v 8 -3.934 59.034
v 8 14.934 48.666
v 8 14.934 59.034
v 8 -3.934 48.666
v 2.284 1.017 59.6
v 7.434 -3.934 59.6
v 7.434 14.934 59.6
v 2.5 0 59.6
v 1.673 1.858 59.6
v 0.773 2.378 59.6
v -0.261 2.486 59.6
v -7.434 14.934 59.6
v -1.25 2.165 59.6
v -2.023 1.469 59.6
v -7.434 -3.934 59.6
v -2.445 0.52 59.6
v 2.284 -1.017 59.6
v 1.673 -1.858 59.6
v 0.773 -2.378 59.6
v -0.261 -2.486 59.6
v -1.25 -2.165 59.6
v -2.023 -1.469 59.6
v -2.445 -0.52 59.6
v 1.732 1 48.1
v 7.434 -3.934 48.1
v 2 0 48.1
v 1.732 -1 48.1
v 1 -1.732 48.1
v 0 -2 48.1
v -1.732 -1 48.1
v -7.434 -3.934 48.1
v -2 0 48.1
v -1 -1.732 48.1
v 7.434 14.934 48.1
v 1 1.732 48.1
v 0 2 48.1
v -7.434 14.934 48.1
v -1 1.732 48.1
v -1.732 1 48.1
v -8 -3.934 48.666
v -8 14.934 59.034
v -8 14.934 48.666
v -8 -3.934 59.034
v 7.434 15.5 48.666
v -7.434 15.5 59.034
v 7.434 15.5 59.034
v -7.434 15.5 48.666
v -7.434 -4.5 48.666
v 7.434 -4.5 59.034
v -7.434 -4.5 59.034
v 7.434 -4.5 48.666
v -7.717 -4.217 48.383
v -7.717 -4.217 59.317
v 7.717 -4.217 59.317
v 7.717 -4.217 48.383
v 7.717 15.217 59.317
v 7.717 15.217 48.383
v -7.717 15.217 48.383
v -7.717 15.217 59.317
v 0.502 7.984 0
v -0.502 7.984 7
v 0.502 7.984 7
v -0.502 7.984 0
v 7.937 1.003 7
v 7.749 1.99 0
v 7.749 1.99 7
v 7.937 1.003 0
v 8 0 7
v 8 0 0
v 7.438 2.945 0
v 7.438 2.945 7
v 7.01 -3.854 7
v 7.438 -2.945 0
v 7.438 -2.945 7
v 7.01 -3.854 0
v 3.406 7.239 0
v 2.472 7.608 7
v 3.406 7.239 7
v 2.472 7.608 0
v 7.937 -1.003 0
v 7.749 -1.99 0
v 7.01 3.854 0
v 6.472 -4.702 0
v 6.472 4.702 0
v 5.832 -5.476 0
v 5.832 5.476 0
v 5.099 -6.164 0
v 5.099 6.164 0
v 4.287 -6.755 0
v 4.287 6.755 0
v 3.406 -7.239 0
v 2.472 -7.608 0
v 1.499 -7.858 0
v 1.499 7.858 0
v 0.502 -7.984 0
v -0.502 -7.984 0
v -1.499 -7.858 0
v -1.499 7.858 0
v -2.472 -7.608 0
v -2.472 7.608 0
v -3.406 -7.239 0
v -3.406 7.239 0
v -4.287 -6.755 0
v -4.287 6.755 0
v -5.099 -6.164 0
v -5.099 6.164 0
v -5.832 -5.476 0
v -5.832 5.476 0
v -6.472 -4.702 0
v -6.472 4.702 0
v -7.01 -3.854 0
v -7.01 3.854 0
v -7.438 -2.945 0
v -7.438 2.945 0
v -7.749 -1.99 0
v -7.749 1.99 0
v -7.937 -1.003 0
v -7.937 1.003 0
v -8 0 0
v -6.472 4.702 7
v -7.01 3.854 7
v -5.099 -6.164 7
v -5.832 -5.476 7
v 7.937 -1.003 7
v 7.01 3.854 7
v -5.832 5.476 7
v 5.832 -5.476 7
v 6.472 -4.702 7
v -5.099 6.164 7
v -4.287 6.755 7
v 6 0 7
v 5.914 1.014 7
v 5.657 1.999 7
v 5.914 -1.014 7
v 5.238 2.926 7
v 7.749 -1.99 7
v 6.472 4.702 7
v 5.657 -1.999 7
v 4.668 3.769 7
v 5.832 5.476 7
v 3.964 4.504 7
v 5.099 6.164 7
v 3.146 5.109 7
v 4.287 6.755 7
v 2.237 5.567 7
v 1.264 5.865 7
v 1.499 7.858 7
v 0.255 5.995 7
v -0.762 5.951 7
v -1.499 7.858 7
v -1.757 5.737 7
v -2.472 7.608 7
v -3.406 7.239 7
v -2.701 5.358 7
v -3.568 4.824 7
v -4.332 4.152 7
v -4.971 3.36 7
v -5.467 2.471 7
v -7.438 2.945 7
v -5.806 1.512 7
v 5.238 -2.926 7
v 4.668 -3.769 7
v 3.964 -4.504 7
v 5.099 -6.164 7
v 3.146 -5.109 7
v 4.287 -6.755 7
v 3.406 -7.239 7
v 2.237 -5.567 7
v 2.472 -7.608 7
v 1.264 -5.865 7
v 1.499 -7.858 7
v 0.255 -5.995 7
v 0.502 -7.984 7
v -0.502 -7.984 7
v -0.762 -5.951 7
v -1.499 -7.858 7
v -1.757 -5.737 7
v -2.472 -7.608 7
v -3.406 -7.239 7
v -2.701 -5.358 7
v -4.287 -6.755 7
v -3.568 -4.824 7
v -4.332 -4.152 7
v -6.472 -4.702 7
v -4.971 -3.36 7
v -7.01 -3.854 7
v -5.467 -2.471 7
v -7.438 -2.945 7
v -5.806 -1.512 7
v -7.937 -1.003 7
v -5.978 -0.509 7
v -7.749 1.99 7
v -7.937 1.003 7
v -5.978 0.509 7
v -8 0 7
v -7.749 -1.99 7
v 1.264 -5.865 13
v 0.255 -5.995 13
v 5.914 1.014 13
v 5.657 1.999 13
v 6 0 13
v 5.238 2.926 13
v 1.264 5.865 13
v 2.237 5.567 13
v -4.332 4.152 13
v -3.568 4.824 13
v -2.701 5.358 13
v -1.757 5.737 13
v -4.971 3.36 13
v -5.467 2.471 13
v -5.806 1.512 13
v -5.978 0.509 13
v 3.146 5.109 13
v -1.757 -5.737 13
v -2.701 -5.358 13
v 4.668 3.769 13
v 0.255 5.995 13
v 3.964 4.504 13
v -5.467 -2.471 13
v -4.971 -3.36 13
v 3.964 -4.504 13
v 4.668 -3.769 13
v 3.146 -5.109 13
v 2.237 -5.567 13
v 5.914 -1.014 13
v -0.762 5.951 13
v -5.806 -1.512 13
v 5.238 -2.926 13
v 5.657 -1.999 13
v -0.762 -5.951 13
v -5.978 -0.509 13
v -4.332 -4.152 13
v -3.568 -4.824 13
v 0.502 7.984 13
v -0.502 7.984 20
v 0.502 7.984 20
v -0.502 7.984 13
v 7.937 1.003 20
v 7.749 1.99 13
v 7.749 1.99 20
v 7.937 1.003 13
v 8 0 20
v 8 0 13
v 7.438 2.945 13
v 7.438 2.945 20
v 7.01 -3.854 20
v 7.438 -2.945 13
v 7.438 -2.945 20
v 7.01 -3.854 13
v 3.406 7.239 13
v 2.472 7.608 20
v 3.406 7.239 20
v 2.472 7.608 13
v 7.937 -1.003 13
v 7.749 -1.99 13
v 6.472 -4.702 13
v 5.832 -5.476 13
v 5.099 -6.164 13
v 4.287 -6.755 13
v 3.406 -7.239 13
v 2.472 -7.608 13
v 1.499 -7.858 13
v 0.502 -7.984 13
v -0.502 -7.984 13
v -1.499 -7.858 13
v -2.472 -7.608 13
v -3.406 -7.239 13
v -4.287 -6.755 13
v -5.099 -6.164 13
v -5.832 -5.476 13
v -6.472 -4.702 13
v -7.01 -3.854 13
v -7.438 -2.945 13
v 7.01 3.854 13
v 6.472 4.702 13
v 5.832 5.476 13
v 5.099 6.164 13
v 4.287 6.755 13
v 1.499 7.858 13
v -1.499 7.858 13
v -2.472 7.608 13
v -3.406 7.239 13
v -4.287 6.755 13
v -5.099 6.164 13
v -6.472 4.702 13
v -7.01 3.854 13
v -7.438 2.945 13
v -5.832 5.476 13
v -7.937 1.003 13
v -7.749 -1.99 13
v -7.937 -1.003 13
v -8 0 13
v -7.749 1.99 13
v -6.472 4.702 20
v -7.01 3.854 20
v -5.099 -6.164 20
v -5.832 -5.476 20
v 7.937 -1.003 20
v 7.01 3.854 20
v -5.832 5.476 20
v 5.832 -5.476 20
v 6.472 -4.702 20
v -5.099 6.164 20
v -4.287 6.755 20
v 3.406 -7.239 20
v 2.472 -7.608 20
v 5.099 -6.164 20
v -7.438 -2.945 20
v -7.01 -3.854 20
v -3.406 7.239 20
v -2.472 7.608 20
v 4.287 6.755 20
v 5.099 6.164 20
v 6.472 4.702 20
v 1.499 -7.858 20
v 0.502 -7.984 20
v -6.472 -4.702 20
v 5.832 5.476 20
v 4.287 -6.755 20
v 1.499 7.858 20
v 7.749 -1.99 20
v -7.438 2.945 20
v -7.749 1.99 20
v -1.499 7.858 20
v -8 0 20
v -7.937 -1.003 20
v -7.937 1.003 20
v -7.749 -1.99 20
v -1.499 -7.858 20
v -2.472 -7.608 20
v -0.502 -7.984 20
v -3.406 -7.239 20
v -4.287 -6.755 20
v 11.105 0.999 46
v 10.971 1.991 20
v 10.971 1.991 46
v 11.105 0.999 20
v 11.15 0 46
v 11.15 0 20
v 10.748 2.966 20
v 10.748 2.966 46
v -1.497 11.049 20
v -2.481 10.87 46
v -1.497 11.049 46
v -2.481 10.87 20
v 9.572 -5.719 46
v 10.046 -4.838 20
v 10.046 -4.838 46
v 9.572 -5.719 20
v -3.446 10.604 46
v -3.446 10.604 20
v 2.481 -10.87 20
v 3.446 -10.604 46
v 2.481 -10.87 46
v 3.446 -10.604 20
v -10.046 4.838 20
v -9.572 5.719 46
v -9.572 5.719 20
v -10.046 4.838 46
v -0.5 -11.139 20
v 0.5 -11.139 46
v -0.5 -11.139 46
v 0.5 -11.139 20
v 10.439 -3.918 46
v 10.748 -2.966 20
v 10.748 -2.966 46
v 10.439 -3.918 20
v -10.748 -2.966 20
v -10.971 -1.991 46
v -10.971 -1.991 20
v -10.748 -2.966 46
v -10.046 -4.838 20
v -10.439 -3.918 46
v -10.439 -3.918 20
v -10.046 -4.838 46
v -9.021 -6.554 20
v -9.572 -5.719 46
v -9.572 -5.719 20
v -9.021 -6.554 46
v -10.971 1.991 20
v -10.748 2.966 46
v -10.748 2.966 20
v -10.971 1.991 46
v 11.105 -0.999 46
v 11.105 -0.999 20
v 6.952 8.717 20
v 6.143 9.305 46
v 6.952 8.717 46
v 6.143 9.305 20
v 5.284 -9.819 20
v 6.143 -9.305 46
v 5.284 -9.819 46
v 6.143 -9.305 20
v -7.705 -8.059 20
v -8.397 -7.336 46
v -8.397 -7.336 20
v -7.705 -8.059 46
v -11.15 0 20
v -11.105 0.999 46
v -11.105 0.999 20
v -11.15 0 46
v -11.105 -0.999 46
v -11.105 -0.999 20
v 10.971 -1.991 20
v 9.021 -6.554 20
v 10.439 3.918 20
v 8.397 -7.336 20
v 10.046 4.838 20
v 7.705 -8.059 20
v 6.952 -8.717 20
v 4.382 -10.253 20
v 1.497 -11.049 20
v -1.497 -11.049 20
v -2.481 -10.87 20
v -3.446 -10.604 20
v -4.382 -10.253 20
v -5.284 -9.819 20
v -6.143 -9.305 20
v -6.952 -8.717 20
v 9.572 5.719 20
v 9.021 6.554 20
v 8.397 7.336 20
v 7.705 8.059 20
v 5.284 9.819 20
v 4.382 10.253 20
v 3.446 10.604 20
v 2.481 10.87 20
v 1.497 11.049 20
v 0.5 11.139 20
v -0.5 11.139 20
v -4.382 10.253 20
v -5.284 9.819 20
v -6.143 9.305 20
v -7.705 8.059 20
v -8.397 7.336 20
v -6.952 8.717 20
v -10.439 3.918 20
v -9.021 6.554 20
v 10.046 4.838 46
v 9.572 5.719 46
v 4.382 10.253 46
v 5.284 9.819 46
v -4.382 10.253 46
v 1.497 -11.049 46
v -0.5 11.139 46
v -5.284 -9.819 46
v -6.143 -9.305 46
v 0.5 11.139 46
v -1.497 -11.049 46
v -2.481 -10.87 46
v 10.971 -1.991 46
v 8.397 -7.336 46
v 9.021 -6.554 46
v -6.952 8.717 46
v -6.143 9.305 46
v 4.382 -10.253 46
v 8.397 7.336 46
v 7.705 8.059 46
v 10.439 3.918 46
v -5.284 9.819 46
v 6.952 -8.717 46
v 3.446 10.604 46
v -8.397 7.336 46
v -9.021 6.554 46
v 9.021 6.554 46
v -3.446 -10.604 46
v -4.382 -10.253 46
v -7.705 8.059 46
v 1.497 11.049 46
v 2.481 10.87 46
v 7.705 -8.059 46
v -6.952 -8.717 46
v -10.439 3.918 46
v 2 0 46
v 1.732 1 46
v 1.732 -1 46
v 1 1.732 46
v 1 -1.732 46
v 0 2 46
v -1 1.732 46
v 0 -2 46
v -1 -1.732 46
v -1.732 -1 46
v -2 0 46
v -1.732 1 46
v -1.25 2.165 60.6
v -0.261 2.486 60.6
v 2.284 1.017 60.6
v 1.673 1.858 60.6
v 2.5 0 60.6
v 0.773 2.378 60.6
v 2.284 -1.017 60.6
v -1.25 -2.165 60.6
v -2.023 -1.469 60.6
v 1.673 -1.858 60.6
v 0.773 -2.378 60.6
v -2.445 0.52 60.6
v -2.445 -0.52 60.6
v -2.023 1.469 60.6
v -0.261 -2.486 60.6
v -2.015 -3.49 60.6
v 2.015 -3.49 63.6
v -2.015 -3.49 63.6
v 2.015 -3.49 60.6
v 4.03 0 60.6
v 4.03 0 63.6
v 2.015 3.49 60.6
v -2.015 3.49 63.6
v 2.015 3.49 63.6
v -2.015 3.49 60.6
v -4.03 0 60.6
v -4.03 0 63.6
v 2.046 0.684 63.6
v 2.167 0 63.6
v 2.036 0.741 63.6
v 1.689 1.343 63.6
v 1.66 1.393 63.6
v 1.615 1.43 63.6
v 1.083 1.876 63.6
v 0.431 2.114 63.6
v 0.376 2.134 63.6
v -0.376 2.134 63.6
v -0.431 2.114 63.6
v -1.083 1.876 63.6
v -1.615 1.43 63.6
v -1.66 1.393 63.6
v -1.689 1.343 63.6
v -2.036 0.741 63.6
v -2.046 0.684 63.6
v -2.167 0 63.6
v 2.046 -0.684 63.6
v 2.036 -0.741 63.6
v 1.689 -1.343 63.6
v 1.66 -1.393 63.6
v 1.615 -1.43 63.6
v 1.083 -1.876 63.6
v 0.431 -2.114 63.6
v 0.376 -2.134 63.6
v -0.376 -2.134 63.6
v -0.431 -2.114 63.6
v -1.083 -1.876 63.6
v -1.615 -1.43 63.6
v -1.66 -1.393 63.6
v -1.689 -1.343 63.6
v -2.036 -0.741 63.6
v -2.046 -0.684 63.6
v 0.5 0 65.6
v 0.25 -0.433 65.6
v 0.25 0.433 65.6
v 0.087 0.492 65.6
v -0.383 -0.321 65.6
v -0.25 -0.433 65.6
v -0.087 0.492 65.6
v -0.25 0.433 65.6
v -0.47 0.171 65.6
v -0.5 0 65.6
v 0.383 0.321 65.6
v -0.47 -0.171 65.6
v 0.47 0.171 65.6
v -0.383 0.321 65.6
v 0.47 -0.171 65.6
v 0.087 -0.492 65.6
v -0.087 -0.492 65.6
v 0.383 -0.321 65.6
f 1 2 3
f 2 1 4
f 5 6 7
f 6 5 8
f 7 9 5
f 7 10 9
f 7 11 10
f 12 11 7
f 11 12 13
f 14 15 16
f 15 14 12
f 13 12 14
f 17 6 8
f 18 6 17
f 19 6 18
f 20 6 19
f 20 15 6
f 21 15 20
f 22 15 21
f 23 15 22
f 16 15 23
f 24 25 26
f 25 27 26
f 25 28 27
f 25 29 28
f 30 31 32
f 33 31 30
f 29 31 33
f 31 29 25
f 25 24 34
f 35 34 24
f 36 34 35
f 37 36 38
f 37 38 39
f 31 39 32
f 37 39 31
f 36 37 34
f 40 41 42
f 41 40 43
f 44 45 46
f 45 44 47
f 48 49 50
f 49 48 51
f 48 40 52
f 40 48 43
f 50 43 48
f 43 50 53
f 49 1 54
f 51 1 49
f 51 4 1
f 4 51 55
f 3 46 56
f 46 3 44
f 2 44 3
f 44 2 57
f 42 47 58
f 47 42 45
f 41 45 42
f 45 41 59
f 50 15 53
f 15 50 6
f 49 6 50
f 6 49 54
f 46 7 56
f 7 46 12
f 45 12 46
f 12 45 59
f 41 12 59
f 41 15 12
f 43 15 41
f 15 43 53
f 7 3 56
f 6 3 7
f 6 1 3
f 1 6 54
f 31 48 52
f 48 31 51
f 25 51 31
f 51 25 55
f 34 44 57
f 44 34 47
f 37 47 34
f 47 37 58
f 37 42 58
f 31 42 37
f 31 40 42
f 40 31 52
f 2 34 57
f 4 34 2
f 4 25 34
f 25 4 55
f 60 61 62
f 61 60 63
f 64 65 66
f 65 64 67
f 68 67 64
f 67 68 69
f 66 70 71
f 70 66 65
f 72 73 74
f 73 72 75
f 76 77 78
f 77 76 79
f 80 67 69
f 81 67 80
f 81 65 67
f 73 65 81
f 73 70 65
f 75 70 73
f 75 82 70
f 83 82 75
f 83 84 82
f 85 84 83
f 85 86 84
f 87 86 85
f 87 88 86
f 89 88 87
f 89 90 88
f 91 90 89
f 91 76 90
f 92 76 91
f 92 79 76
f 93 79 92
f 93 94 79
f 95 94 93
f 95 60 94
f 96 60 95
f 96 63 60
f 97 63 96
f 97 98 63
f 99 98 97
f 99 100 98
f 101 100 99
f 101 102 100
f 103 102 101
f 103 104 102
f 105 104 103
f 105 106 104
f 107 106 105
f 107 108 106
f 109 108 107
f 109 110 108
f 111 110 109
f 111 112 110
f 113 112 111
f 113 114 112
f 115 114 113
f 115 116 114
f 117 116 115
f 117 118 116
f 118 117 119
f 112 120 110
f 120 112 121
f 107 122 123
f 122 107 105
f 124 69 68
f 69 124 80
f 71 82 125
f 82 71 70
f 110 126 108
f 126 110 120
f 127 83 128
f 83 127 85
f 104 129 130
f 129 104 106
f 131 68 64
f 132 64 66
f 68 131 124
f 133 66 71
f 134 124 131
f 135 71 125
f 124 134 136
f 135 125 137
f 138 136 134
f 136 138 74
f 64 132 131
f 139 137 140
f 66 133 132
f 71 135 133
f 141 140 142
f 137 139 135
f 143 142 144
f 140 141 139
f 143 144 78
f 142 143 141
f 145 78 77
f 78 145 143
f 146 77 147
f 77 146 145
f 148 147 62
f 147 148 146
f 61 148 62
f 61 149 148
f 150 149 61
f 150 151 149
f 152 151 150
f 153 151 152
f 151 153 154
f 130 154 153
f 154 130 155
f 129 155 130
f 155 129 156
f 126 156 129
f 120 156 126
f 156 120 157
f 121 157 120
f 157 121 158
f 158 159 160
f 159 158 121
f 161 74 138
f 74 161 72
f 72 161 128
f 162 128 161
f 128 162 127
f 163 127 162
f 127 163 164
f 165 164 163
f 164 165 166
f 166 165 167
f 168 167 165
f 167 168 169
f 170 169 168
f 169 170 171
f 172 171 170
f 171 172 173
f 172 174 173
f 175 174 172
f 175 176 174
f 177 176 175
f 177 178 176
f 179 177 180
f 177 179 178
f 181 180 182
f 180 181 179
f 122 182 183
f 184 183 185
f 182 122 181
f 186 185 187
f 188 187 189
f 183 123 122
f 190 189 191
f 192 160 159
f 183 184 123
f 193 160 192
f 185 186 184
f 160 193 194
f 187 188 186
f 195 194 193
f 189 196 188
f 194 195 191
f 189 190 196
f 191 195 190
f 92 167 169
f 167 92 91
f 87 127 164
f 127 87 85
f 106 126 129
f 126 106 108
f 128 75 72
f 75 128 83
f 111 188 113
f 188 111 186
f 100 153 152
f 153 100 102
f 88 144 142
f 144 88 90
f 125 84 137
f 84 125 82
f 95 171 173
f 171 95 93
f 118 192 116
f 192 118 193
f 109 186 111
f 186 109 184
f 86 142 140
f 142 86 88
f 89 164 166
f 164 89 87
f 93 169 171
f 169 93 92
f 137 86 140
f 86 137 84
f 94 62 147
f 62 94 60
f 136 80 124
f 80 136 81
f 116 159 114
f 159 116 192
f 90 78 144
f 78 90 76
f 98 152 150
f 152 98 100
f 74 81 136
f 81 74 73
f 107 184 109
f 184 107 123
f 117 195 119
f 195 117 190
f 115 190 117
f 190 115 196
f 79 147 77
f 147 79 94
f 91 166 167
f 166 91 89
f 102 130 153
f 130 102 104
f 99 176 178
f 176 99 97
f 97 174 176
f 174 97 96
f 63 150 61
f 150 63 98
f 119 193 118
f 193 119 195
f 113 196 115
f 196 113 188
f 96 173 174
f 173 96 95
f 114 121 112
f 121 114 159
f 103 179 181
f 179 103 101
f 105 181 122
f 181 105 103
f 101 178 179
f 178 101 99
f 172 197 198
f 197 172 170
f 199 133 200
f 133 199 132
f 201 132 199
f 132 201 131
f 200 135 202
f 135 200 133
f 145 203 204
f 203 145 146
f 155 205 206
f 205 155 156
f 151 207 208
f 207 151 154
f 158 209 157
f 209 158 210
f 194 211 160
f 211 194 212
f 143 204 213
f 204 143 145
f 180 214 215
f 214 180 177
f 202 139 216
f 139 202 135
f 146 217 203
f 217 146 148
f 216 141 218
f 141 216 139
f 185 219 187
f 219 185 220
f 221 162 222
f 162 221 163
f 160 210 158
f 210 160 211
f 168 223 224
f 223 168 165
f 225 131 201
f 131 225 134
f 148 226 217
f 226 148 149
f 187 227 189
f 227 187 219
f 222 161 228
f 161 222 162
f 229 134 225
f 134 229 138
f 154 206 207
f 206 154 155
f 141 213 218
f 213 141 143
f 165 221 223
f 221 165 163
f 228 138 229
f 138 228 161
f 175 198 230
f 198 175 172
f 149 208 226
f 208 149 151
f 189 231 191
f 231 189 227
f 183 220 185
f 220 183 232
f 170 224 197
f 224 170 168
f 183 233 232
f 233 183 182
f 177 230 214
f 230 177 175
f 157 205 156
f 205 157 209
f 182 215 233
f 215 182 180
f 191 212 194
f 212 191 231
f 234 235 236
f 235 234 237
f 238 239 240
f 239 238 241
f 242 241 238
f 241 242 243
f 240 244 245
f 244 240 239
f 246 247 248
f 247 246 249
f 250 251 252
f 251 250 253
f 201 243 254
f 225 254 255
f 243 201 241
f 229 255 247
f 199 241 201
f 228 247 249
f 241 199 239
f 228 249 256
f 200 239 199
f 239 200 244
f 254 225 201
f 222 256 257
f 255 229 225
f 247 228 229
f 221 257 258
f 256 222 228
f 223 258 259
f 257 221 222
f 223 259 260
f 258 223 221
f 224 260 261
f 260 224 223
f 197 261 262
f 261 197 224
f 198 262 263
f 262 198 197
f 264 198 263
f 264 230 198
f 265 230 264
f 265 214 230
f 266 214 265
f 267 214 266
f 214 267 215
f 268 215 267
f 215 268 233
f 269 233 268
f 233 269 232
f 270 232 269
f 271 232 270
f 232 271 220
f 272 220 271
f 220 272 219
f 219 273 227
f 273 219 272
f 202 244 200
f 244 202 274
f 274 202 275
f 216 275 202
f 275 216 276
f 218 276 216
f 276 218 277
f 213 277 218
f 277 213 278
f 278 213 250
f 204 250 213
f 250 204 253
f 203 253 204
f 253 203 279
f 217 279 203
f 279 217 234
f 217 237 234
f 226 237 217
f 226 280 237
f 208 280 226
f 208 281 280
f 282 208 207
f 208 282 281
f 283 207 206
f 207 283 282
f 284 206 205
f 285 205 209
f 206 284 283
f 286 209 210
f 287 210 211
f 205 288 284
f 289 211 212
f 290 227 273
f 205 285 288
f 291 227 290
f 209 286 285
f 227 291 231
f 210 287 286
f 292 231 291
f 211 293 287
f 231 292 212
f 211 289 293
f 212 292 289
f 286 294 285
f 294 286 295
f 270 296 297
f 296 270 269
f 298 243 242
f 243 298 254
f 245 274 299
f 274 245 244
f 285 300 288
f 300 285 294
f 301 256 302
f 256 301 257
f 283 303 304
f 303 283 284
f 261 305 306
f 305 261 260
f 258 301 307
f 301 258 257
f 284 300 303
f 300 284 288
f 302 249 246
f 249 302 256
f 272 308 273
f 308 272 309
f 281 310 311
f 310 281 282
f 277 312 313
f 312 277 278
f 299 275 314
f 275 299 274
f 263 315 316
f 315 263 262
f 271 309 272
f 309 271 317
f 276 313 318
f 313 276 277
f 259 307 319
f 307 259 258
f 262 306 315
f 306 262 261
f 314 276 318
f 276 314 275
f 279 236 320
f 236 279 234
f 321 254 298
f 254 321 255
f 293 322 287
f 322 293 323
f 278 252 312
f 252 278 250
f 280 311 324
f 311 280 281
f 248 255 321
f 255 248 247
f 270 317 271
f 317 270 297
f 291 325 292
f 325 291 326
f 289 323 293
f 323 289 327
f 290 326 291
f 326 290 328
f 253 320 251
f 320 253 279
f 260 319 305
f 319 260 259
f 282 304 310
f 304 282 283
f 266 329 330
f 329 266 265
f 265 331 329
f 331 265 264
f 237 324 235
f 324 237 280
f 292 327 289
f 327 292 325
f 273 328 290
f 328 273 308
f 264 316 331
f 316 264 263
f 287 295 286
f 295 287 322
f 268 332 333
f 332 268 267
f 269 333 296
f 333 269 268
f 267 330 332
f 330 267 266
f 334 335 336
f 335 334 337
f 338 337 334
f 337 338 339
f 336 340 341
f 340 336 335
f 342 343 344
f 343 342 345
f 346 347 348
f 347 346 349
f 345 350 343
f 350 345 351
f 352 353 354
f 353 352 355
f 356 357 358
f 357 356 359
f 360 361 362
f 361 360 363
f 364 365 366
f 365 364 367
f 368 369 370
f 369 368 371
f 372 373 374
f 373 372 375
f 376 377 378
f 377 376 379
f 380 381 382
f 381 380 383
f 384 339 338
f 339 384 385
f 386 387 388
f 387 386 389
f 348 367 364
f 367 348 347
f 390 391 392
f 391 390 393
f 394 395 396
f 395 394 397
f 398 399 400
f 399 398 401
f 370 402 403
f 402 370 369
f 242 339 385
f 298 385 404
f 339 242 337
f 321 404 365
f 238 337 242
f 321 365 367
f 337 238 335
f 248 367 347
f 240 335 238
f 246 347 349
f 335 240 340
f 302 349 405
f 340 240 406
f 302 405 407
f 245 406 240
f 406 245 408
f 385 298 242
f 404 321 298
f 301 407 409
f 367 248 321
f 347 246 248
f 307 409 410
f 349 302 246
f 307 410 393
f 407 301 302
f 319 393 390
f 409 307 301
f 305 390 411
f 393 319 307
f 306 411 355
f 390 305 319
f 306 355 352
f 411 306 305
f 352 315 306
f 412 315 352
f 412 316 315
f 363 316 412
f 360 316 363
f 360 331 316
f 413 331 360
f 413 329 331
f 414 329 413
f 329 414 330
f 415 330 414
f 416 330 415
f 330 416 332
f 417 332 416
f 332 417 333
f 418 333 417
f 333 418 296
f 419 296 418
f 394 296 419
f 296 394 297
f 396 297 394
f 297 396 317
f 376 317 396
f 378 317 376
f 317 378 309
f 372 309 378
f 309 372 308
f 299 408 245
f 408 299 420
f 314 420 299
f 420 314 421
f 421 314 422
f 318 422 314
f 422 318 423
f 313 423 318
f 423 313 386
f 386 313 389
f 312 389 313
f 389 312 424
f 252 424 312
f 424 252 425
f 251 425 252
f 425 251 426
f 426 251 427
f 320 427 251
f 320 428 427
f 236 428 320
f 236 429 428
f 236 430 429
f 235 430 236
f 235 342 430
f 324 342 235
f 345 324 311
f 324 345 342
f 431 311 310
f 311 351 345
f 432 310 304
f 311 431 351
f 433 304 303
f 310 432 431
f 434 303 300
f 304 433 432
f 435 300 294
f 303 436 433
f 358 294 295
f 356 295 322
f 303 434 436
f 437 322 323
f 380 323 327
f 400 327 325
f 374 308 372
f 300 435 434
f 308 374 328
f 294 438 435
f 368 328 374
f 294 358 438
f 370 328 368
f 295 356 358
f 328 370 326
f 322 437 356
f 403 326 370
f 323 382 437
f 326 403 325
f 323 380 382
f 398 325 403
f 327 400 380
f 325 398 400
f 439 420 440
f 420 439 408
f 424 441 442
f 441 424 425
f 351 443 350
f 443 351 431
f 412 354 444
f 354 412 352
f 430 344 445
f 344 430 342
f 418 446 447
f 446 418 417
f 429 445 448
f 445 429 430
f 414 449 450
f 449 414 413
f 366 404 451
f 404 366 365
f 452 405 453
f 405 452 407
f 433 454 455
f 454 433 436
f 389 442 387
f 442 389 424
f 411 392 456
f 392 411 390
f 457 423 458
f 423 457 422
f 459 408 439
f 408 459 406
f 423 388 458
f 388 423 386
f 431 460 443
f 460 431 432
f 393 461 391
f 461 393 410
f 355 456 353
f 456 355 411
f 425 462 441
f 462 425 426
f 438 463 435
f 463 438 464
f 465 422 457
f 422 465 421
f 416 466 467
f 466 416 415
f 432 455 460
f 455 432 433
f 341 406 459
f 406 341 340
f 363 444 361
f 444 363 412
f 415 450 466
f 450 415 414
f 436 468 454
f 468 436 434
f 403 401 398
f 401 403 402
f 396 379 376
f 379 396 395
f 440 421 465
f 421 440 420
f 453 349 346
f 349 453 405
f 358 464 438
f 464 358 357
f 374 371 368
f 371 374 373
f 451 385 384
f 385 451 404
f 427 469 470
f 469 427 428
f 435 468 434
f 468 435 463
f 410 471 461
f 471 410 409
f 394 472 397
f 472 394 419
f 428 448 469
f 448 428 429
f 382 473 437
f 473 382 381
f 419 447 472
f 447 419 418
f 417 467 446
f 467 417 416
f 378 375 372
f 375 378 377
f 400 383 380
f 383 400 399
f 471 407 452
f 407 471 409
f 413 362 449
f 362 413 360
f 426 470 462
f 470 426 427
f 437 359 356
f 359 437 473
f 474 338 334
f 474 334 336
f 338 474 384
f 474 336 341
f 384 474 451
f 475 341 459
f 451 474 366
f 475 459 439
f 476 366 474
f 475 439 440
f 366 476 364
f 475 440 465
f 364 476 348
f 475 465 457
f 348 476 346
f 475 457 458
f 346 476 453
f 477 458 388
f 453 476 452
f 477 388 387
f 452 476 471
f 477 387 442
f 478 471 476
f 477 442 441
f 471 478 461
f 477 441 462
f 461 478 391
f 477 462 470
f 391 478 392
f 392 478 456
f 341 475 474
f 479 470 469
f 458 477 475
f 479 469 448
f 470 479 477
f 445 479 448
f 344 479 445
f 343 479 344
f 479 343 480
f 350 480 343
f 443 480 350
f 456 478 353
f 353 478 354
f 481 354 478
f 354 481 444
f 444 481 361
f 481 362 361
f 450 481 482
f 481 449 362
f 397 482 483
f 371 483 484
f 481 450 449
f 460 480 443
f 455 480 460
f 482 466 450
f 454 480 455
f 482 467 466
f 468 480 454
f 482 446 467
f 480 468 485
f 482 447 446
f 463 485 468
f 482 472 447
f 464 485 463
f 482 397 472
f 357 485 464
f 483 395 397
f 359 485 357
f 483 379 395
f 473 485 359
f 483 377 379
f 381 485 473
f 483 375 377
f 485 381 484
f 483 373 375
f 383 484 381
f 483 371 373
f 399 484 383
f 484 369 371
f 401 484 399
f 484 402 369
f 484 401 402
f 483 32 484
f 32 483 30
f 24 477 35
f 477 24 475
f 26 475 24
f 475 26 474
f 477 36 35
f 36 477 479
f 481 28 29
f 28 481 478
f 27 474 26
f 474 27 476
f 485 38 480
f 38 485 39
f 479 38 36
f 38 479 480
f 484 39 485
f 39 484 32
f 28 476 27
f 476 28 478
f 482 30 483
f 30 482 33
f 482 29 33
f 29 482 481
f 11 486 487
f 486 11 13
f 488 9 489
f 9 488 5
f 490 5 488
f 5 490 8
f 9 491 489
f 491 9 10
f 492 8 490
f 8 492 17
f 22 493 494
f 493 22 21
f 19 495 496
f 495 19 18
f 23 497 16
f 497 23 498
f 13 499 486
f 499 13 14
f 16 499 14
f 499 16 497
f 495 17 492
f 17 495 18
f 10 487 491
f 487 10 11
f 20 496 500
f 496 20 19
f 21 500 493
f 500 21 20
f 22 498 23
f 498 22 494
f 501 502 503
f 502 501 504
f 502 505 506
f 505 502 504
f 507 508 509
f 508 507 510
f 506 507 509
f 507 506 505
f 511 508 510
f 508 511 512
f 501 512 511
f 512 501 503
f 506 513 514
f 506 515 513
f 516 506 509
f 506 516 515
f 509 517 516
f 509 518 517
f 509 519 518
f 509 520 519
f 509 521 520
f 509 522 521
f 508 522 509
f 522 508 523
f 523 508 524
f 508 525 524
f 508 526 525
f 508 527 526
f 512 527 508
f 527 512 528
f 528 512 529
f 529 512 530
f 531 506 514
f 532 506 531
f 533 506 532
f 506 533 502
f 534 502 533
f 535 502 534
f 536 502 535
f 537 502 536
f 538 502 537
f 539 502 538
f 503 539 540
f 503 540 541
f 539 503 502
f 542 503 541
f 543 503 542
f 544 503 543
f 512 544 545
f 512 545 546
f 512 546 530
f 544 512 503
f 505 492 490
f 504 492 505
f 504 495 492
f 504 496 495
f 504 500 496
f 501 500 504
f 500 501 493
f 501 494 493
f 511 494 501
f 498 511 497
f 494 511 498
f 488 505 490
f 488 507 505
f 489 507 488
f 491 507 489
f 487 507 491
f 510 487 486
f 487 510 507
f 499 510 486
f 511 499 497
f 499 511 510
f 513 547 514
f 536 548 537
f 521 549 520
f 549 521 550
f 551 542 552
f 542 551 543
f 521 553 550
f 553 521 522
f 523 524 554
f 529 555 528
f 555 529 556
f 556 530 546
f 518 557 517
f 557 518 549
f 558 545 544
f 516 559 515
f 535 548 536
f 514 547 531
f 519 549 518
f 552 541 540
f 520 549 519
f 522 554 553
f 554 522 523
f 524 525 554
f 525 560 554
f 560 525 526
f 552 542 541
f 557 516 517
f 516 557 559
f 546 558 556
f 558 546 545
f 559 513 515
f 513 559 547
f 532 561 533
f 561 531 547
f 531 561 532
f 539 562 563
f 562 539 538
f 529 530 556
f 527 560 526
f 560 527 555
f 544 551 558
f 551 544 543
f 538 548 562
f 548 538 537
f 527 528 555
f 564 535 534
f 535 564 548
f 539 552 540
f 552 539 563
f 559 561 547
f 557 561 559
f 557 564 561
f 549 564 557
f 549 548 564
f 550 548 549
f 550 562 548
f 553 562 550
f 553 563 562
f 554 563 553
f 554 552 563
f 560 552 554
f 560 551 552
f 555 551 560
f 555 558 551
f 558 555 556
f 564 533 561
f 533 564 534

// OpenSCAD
/*
Name: E3D-v6 All Metal HotEnd in OpenSCAD
Author: Jons Collasius from Germany/Hamburg

License: CC BY-NC-SA 4.0
License URL: https://creativecommons.org/licenses/by-nc-sa/4.0/

Creator of "E3D-v6 All Metal HotEnd": E3D Online - JR 
URL E3D v6: http://wiki.e3d-online.com/wiki/E3D-v6_Documentation
*/

// ######################################################################################################################

/* [Global] */

// resolution of round object. each line segment is fnr mm long. fnr = 1 crude and good for development (its faster), aim for fnr = 0.4 or smaller for a production render. smaller means more details (and a lot more time to render).
fnresolution = 1;
// detail level
detaillevel = 0; // [0:coarse render only outlines,1:fine render with all details]

// ######################################################################################################################
print_part();

// ######################################################################################################################
module print_part() {
	e3d();
}

// ######################################################################################################################
module e3d() {
	difference() {
		union() {
			translate([0,0,0]) fncylinder(r=8,h=7);
			translate([0,0,6]) fncylinder(r=6,h=8);
			translate([0,0,13]) fncylinder(r=8,h=8);
			translate([0,0,20]) fncylinder(r=11.15,h=26);
			translate([0,0,0]) fncylinder(r=8,h=7);
			translate([0,0,45]) fncylinder(r=2,h=4.1);
			translate([-8,-4.5,48.1]) chamfercube([16,20,11.5],side=[0.4,0.4,0.4,0.4],top=[0.4,0.4,0.4,0.4],bottom=[0.4,0.4,0.4,0.4]);
			translate([0,0,58.6]) fncylinder(r=2.5,h=3);
			translate([0,0,60.6]) fncylinder(r=4.03,h=3,fn=6);
			translate([0,0,62.6]) fncylinder(r=3,r2=0.5,h=3);
		}
		if(detaillevel==1) {
			translate([0,0,-1]) fncylinder(r=1.6,h=64.1);
			translate([0,0,62.1]) fncylinder(r=0.25,h=4,fn=10);
			translate([0,0,16]) fnpipe(r=9,r2=4.475,h=1.5); 
			translate([0,0,18.5]) fnpipe(r=9,r2=4.475,h=1.5); 
			for ( i = [0 : 9] ) {
				translate([0,0,21+i*2.5]) fnpipe(r=12.15,r2=4.475+i*0.15,h=1.5); 
			}
			translate([-9,8,55.6]) rotate([0,90,0]) fncylinder(r=3.05, h=18);
			translate([-9,8,54.6]) cube([18,8.5,2]);
			translate([0,13,47.1]) fncylinder(r=1.4, h=13.5);
			translate([4.45,-1,54.8]) rotate([0,90,0]) fncylinder(r=1.4, h=4.45);
			translate([3.45,-2.5,57.6]) rotate([0,90,0]) fncylinder(r=1.15, h=5.45);
		}
	}
}

// ######################################################################################################################
module chamfercube(xyz=[0,0,0],side=[0,0,0,0],top=[0,0,0,0],bottom=[0,0,0,0],x=false,y=false,z=false) {
	translate([x==true?-xyz[0]/2:0,y==true?-xyz[1]/2:0,z==true?-xyz[2]/2:0]) difference() {
		cube(xyz);
		if(side[0]>=0) translate([0,0,xyz[2]/2]) rotate([0,0,45]) cube([side[0]*2,side[0]*3,xyz[2]+2],center=true);
		if(side[1]>=0) translate([xyz[0],0,xyz[2]/2]) rotate([0,0,-45]) cube([side[1]*2,side[1]*3,xyz[2]+2],center=true);
		if(side[2]>=0) translate([xyz[0],xyz[1],xyz[2]/2]) rotate([0,0,45]) cube([side[2]*2,side[2]*3,xyz[2]+2],center=true);
		if(side[3]>=0) translate([0,xyz[1],xyz[2]/2]) rotate([0,0,-45]) cube([side[3]*2,side[3]*3,xyz[2]+2],center=true);
		if(top[0]>=0) translate([xyz[0]/2,0,xyz[2]]) rotate([-45,0,0]) cube([xyz[0]+2,top[0]*2,top[0]*3,],center=true);
		if(top[2]>=0) translate([xyz[0]/2,xyz[1],xyz[2]]) rotate([45,0,0]) cube([xyz[0]+2,top[2]*2,top[2]*3,],center=true);
		if(top[3]>=0) translate([0,xyz[1]/2,xyz[2]]) rotate([0,45,0]) cube([top[3]*2,xyz[1]+2,top[3]*3,],center=true);
		if(top[1]>=0) translate([xyz[0],xyz[1]/2,xyz[2]]) rotate([0,-45,0]) cube([top[1]*2,xyz[1]+2,top[1]*3,],center=true);
		if(bottom[0]>=0) translate([xyz[0]/2,0,0]) rotate([45,0,0]) cube([xyz[0]+2,bottom[0]*2,bottom[0]*3,],center=true);
		if(bottom[2]>=0) translate([xyz[0]/2,xyz[1],0]) rotate([-45,0,0]) cube([xyz[0]+2,bottom[2]*2,bottom[2]*3,],center=true);
		if(bottom[3]>=0) translate([0,xyz[1]/2,0]) rotate([0,-45,0]) cube([bottom[3]*2,xyz[1]+2,bottom[3]*3,],center=true);
		if(bottom[1]>=0) translate([xyz[0],xyz[1]/2,0]) rotate([0,45,0]) cube([bottom[1]*2,xyz[1]+2,bottom[1]*3,],center=true);
	}	
}

// ######################################################################################################################
module fnpipe(r,r2,h,fn){
	if (fn==undef) {
		difference() {
			fncylinder(r=r,h=h,$fn=2*r*3.14/fnresolution);
			translate([0,0,-1]) fncylinder(r=r2,h=h+2,$fn=2*r*3.14/fnresolution);
		}
	} else {
		difference() {
			fncylinder(r=r,h=h,fn=fn);
			translate([0,0,-1]) fncylinder(r=r2,h=h+2,fn=fn);
		}
	}
}

// ######################################################################################################################
module fncylinder(r,r2,h,fn){
	if (fn==undef) {
		if (r2==undef) {
			cylinder(r=r,h=h,$fn=2*r*3.14/fnresolution);
		} else {
			cylinder(r=r,r2=r2,h=h,$fn=2*r*3.14/fnresolution);
		}
	} else {
		if (r2==undef) {
			cylinder(r=r,h=h,$fn=fn);
		} else {
			cylinder(r=r,r2=r2,h=h,$fn=fn);
		}
	}
}
